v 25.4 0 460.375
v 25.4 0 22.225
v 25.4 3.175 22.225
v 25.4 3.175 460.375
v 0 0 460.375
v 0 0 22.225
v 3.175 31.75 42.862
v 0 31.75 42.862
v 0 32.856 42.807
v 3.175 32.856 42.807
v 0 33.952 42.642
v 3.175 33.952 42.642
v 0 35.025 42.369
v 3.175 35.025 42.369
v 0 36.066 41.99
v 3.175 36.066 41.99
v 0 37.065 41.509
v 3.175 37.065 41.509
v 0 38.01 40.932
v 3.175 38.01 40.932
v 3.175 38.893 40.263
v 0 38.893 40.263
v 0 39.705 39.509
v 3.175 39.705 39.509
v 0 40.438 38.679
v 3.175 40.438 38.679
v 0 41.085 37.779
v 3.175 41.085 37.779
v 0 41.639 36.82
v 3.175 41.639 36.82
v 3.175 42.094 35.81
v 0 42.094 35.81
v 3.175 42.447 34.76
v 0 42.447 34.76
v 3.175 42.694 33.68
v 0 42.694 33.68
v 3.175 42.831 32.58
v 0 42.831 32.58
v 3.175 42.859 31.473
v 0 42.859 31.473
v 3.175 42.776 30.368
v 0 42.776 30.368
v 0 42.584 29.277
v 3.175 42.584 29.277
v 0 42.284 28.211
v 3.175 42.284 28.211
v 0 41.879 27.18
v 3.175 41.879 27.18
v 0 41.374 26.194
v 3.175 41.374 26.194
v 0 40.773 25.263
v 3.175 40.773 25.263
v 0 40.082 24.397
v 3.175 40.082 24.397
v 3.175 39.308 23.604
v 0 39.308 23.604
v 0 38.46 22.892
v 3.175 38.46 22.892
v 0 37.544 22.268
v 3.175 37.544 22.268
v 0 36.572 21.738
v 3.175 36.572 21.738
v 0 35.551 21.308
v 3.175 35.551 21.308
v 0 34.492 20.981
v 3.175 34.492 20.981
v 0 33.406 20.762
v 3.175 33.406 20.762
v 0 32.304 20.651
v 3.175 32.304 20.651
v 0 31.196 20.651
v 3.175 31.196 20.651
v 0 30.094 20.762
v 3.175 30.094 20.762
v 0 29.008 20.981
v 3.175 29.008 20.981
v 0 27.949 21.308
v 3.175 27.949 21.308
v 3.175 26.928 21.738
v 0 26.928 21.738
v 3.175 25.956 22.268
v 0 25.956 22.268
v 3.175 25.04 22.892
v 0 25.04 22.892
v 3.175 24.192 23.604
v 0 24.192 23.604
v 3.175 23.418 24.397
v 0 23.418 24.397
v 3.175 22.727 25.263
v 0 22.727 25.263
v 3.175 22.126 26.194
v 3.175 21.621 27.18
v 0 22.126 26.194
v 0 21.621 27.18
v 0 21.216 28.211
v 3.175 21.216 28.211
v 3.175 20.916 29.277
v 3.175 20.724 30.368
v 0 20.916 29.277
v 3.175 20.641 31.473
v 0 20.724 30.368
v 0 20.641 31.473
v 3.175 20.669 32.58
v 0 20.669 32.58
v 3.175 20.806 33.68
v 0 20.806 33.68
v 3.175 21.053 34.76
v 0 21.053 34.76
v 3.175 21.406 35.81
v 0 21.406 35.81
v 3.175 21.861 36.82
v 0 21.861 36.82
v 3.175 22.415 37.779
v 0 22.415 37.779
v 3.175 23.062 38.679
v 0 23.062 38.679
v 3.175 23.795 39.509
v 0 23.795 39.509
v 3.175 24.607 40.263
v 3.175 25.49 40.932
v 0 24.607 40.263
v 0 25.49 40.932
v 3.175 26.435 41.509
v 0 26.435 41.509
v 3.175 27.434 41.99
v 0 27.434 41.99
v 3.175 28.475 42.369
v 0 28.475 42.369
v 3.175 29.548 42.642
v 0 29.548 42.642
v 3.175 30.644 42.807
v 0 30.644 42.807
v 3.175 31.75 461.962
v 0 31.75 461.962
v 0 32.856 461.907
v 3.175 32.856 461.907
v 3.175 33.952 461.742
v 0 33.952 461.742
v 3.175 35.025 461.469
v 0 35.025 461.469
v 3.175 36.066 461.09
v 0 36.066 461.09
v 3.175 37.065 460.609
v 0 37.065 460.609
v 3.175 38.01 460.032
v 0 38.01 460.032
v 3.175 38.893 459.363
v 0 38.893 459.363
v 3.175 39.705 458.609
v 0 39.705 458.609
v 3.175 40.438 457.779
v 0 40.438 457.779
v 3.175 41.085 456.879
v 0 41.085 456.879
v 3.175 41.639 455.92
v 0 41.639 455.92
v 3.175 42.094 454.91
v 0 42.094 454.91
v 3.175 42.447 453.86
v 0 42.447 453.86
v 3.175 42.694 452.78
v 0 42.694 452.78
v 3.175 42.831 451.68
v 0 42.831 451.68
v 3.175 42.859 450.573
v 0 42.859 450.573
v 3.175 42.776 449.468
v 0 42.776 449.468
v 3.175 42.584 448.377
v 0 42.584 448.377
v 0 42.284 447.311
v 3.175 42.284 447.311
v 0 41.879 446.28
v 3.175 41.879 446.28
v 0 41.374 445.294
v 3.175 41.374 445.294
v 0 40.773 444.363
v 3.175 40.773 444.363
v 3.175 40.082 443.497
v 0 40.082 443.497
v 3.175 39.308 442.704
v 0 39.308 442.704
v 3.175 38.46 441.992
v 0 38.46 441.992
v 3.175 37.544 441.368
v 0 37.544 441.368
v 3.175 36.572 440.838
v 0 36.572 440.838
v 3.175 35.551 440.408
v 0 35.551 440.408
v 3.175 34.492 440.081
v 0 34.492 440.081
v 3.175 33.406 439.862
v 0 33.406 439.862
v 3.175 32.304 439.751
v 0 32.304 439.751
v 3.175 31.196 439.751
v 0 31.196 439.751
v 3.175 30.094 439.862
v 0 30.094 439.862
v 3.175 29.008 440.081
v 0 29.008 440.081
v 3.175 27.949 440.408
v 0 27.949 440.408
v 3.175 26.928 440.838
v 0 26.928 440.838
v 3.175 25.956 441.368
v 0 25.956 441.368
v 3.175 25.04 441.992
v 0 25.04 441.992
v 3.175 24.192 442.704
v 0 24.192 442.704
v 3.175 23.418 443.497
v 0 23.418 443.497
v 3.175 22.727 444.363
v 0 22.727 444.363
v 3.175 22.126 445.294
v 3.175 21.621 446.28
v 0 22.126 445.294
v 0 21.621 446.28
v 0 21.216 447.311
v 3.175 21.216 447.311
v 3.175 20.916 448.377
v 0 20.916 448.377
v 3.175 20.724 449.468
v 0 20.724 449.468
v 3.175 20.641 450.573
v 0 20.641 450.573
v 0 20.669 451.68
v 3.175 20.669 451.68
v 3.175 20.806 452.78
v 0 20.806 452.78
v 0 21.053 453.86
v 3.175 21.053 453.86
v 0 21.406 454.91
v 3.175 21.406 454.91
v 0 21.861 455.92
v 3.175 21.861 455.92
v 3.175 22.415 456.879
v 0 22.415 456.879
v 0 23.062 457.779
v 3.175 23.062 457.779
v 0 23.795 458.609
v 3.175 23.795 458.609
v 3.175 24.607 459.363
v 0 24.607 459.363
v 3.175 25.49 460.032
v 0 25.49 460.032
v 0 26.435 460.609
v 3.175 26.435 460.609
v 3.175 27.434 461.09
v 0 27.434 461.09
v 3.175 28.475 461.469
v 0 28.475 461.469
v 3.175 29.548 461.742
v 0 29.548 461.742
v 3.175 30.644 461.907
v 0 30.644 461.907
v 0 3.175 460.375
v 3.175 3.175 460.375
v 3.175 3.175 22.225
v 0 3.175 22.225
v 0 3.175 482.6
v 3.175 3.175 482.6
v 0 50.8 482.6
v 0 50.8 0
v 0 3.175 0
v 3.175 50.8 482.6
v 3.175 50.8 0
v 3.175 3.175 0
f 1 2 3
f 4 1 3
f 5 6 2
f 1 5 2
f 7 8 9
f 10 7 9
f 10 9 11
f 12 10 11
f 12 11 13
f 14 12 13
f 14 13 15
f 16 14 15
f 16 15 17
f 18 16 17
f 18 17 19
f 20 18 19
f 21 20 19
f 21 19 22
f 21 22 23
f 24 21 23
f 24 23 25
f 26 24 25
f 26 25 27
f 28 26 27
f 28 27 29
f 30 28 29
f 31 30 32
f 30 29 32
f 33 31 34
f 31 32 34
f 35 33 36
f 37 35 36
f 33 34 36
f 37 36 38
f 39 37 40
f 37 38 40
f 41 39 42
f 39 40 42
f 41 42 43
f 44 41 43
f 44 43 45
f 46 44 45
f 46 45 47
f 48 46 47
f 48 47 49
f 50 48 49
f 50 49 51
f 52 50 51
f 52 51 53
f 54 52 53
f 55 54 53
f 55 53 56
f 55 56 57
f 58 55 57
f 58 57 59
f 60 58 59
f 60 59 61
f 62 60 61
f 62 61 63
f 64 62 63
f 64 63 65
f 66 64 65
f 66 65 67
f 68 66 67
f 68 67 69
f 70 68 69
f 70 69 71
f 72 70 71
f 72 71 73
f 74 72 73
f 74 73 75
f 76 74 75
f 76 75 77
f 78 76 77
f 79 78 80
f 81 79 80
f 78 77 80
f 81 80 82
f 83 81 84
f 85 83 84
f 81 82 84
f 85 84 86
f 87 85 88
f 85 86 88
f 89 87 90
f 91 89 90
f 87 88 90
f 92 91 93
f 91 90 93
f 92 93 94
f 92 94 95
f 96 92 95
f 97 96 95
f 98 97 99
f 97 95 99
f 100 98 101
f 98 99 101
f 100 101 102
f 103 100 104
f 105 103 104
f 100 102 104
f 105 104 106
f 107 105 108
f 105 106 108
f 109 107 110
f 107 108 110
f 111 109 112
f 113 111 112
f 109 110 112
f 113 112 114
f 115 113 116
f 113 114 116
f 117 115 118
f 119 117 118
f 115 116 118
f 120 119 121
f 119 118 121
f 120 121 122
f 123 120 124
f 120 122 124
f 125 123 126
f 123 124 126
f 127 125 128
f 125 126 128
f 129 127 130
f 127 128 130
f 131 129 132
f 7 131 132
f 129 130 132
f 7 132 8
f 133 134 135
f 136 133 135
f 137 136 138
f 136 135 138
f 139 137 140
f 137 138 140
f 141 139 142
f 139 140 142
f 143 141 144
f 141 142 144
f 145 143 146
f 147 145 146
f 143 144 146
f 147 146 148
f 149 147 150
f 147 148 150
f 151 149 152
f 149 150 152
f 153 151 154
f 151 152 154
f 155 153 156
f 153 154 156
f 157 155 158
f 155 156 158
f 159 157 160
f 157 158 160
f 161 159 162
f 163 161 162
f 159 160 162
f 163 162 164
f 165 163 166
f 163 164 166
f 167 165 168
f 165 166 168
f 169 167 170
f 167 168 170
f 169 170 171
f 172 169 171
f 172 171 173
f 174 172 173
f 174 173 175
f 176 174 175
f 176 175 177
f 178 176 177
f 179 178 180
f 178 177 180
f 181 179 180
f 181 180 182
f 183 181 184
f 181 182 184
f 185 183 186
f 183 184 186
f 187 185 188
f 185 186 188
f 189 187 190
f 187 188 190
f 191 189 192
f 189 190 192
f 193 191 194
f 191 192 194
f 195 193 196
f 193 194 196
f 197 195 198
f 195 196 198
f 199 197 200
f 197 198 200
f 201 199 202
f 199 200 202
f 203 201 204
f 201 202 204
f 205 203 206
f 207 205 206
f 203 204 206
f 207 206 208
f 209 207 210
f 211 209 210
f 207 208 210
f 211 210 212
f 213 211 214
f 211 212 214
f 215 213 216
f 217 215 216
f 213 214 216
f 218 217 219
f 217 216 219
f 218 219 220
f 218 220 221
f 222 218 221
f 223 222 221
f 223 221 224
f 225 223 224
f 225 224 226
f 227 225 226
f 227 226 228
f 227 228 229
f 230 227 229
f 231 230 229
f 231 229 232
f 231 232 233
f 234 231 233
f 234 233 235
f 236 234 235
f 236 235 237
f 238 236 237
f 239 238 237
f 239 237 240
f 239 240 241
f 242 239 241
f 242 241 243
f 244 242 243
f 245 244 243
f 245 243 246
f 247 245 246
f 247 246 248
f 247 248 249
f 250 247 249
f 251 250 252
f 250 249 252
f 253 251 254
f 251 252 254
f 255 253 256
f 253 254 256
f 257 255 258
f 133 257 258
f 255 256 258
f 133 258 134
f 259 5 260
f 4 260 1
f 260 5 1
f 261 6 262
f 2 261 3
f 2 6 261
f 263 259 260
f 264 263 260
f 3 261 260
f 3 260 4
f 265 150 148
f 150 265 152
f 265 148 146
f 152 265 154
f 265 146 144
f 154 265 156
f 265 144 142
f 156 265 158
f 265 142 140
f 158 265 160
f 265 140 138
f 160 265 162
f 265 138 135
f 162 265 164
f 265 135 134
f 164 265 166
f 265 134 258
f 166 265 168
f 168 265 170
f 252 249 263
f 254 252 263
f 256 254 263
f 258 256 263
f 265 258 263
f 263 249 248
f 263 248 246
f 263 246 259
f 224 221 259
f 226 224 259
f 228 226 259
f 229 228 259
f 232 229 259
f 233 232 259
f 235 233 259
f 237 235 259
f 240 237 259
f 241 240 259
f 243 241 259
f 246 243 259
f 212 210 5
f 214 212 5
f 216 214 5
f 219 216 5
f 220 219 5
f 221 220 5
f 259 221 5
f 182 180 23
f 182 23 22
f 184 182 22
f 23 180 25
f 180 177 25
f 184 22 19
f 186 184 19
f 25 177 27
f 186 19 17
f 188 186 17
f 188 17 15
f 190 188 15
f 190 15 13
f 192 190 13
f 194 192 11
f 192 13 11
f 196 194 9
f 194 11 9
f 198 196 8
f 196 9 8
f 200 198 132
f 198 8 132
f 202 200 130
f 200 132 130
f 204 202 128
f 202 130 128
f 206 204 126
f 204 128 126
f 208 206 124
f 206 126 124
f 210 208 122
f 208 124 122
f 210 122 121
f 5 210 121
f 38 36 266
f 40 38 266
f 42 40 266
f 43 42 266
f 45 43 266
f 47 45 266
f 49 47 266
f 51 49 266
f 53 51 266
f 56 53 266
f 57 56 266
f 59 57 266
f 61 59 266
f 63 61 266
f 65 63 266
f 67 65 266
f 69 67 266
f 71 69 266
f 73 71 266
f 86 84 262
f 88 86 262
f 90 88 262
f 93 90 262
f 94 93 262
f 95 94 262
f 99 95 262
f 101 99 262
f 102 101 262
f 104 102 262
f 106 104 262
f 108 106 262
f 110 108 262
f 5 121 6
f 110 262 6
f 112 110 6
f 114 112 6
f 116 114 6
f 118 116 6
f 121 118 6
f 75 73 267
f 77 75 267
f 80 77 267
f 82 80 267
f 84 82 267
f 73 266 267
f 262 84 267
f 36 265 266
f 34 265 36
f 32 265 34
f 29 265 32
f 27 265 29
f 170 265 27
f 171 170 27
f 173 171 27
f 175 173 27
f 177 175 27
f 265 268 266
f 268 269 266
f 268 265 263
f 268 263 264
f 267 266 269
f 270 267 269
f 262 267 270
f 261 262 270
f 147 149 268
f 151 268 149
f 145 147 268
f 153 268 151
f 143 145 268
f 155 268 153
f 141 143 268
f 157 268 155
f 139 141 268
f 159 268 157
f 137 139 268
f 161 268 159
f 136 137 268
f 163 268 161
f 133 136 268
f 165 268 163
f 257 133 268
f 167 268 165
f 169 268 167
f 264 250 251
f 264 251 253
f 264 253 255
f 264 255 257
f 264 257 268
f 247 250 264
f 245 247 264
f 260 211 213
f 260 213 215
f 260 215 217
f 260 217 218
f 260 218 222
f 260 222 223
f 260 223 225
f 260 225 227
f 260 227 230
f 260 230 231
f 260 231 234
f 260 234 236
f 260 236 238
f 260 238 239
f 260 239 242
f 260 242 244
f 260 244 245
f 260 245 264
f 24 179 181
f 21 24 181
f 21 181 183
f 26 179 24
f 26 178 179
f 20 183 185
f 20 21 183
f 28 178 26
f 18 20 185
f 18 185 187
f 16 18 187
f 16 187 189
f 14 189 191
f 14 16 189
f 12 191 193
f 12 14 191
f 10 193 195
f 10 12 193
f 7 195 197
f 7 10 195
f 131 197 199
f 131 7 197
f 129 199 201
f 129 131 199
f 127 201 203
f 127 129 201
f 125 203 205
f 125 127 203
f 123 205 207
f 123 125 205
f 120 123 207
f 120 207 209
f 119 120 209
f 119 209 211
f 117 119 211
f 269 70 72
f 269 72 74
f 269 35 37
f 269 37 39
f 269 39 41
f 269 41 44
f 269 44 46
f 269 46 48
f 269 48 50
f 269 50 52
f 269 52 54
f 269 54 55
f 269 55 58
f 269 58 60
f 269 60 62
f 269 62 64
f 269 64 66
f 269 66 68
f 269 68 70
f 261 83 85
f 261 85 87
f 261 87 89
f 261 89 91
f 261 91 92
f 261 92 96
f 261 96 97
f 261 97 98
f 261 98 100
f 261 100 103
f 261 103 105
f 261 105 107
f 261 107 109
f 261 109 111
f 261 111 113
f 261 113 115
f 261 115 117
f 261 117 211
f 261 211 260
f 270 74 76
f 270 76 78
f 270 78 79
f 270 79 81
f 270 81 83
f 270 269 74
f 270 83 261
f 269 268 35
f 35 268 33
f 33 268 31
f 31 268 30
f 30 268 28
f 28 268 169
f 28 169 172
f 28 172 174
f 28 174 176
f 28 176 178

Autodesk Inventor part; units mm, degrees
ref_plane "YZ Plane" through (0, 0, 0) normal (1, 0, 0) x (0, 1, 0)
ref_plane "XZ Plane" through (0, 0, 0) normal (0, 1, 0) x (-1, 0, 0)
ref_plane "XY Plane" through (0, 0, 0) normal (0, 0, 1) x (1, 0, 0)
sketch "Sketch1" plane through (0, 0, 0) normal (0, 0, 1) x (1, 0, 0)
  line L0 (0, 0) -> (25.4, 0)
  line L1 (25.4, 0) -> (25.4, 3.175)
  line L2 (3.175, 50.8) -> (0, 50.8)
  line L3 (0, 50.8) -> (0, 0)
  line L4 (3.175, 50.8) -> (3.175, 3.175)
  line L5 (3.175, 3.175) -> (25.4, 3.175)
  dimension "d0" = 50.8
  dimension "d1" = 25.4
  dimension "d2" = 3.175
  dimension "d3" = 3.175
extrude "Extrusion1" add sketch "Sketch1" along normal blind 482.6
sketch "Sketch2" plane through (0, 0, 0) normal (-1, 0, 0) x (0, 0, 1)
  line L0 (482.6, 0) -> (482.6, 50.8) projected
  line L1 (0, 0) -> (482.6, 0) projected
  circle A0 centre (450.85, 31.75) radius 11.1125
  line L2 (0, 50.8) -> (0, 0) projected
  circle A1 centre (31.75, 31.75) radius 11.1125
  dimension "d6" = 22.225
  dimension "d7" = 31.75
  dimension "d8" = 31.75
  dimension "d17" = 31.75
  dimension "d18" = 31.75
extrude "Extrusion2" cut sketch "Sketch2" against normal blind 508
sketch "Sketch3" plane through (0, 0, 0) normal (0, -1, 0) x (1, 0, 0)
  line L0 (0, 0) -> (0, 482.6) projected
  line L1 (0, 0) -> (25.4, 0) projected
  line L2 (25.4, 0) -> (25.4, 482.6) projected
  line L3 (0, 22.225) -> (25.4, 22.225)
  line L4 (25.4, 482.6) -> (0, 482.6) projected
  line L5 (0, 460.375) -> (25.4, 460.375)
  dimension "d13" = 22.225
  dimension "d16" = 22.225
extrude "Extrusion3" cut sketch "Sketch3" against normal blind 3.175 contours L0 L3 L2 L1 | L0 L4 L2 L5
equation "\"d3\" = d2"
equation "\"d17\" = d8"
equation "\"d18\" = d7"
equation "\"d16\" = d13"
properties part number "manipulator L frame middle"
